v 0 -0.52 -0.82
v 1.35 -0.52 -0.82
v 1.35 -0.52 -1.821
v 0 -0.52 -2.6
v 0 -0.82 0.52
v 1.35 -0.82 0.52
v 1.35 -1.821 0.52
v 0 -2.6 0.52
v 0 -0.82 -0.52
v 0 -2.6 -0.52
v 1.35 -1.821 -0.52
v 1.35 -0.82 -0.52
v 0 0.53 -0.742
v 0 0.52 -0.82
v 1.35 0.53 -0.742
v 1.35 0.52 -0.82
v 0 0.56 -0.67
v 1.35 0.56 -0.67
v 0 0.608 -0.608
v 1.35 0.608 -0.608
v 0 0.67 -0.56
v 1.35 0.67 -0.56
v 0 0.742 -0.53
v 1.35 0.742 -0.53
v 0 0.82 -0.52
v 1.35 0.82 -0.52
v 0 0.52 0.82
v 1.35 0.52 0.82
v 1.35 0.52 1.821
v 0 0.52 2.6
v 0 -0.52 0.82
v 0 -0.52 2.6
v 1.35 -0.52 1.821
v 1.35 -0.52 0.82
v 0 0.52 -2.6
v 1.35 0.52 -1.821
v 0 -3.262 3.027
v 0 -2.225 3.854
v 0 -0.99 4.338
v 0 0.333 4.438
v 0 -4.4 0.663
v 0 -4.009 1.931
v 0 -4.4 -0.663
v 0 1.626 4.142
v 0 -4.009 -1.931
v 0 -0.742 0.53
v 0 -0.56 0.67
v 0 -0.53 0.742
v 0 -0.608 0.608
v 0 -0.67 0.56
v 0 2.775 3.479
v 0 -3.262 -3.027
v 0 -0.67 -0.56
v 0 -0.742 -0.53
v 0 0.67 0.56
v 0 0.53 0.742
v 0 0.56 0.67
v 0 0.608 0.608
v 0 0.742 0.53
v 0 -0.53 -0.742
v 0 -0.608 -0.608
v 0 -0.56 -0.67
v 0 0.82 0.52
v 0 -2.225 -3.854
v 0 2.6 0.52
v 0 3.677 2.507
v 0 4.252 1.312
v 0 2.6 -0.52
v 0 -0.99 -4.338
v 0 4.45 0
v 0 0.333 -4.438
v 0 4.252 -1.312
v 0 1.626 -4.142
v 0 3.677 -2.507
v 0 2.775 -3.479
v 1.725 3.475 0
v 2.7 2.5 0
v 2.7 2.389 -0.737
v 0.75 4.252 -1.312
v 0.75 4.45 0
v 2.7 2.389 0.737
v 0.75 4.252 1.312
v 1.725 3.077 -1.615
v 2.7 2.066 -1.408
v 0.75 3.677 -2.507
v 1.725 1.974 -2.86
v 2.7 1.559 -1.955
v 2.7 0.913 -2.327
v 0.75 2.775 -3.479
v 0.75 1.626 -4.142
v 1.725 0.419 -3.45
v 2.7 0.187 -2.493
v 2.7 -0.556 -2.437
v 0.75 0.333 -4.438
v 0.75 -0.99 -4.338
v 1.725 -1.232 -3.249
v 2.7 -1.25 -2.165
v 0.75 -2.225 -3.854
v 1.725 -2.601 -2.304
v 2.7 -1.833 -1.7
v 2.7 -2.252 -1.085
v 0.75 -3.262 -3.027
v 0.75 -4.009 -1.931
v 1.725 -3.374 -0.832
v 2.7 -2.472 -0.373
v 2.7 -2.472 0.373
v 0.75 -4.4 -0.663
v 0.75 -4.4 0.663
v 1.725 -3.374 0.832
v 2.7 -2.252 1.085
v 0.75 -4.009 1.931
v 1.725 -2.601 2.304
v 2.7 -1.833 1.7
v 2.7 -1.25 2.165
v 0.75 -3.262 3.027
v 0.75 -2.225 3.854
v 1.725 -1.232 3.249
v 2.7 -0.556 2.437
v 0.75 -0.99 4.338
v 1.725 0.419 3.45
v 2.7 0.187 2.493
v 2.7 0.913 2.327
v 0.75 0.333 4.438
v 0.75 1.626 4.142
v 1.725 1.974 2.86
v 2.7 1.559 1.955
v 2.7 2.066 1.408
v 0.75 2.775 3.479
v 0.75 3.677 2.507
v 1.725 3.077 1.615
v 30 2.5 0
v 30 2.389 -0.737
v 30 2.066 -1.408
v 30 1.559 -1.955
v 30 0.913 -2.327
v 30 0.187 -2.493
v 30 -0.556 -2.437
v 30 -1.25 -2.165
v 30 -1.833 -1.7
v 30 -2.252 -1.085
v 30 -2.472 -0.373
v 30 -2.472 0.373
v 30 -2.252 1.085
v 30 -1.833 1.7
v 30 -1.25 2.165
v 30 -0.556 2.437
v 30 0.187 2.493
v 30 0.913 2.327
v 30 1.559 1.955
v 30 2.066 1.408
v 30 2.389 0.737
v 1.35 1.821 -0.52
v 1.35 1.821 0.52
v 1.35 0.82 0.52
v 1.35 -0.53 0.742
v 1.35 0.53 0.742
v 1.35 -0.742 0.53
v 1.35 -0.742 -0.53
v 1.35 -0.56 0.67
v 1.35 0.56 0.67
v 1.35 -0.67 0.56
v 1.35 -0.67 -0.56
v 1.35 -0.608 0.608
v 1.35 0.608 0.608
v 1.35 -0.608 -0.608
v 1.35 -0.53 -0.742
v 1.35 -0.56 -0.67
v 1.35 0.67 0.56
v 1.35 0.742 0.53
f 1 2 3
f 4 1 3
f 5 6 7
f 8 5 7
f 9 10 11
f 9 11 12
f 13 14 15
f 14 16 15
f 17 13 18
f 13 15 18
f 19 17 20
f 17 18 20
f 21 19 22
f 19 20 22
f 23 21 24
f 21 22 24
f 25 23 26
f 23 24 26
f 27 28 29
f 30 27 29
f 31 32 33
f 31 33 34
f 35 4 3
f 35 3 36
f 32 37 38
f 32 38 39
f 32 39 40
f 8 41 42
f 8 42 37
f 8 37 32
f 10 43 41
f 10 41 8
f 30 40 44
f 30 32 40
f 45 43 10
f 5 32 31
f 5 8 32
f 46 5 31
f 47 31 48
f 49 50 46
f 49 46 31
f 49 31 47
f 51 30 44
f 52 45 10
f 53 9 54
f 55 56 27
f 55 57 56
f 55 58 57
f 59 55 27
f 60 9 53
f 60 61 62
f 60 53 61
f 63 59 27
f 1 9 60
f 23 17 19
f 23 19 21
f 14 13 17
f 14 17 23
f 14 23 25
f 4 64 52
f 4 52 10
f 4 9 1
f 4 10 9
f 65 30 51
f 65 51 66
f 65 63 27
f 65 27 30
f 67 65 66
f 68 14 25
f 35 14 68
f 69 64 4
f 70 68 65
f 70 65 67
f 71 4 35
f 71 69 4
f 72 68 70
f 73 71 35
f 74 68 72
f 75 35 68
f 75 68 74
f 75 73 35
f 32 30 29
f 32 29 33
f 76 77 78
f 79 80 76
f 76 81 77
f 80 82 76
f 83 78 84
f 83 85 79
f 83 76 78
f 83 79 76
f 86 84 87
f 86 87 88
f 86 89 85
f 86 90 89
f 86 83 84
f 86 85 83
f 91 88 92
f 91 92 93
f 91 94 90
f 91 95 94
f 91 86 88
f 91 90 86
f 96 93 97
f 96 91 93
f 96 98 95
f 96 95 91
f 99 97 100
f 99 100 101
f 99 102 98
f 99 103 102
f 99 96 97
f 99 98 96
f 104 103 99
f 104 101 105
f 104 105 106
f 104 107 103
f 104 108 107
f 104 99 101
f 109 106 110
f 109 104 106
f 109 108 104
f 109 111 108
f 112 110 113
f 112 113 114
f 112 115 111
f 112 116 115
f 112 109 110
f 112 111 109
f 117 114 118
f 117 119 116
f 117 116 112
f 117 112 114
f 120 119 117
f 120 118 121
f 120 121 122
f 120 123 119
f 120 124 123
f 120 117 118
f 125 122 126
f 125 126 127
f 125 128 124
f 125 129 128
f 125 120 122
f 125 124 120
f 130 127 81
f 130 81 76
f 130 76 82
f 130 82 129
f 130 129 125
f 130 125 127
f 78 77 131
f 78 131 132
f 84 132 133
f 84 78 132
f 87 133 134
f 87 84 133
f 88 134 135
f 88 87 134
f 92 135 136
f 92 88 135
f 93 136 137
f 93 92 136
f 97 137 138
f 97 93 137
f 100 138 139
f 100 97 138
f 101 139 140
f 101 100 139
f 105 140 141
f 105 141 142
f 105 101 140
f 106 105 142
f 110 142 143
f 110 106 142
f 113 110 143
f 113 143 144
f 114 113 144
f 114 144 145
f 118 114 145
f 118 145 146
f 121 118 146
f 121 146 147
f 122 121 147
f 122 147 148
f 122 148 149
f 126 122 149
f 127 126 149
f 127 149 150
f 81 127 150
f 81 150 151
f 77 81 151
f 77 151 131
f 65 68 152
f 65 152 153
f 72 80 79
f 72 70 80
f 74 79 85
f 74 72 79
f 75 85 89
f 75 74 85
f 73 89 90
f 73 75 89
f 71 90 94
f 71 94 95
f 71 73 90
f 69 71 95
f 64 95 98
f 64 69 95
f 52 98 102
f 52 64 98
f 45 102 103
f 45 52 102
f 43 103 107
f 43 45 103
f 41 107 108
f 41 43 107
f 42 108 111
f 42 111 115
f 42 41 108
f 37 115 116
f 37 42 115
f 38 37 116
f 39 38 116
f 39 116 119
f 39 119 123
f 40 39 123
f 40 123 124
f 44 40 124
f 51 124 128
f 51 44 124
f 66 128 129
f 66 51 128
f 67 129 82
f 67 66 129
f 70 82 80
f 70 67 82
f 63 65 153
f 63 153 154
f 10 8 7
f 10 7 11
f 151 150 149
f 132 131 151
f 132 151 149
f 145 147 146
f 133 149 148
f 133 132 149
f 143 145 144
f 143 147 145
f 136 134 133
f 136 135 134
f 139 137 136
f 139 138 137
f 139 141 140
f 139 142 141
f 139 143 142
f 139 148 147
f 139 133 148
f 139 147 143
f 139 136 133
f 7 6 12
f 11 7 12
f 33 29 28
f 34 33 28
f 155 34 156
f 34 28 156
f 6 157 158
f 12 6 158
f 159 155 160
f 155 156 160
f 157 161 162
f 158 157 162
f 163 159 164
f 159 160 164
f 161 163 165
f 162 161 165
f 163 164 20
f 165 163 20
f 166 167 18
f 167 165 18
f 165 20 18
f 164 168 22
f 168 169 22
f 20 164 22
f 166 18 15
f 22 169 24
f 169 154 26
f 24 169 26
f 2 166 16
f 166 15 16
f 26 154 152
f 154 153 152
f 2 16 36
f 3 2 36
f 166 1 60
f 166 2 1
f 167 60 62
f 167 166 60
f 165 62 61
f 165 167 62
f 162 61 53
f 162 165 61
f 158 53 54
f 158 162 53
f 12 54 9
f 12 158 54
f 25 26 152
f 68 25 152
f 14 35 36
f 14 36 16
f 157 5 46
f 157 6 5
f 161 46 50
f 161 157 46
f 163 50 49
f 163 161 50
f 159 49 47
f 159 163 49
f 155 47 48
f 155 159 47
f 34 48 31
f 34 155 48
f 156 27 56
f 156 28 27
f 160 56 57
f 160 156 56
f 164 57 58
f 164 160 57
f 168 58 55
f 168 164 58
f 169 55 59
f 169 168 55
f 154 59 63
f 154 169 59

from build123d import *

# Parameters (mm, degrees)
CROSSRECESS_DEPTH = 1.35
DRAFT9_ANGLE      = 30
FILLET5_R         = 0.3
SKETCH10_W        = 0.8
SKETCH10_H        = 2.5


with BuildPart() as part:
    # Sketch1 → Base (revolve)
    with BuildSketch(Plane.XY):
        Polygon((30, 2.5), (4.3, 2.5), (2.7, 2.5), (0.75, 4.45), (0, 4.45), (0, 0), (30, 0), align=None)
    revolve(axis=Axis((4.515812911, 0, 0), (-1, 0, 0)))

    # Sketch6 → CrossRecess (cut)
    with BuildSketch(Plane(origin=(0, 0, 0), x_dir=(0, 0, -1), z_dir=(1, 0, 0))):
        Polygon((0.52, 0.52), (0.52, 2.6), (-0.52, 2.6), (-0.52, 0.52), (-2.6, 0.52), (-2.6, -0.52), (-0.52, -0.52), (-0.52, -2.6), (0.52, -2.6), (0.52, -0.52), (2.6, -0.52), (2.6, 0.52), align=None)
    extrude(amount=CROSSRECESS_DEPTH, mode=Mode.SUBTRACT)

    # Draft9
    draft9_faces = [part.faces().sort_by_distance(p)[0] for p in [
        (0.675, -2.6, 0),
        (0.675, 0, 2.6),
        (0.675, 0, -2.6),
        (0.675, 2.6, 0),
    ]]
    draft(draft9_faces, Plane(origin=(0, 4.45, 0), x_dir=(0, 0, -1), z_dir=(-1, 0, 0)), DRAFT9_ANGLE)

    # Fillet5
    fillet5_edges = [part.edges().sort_by_distance(p)[0] for p in [
        (0.675, 0.52, 0.52),
        (0.675, -0.52, 0.52),
        (0.675, -0.52, -0.52),
        (0.675, 0.52, -0.52),
    ]]
    fillet(fillet5_edges, radius=FILLET5_R)

    # Sketch10 → Revolve2 (revolve)
    with BuildSketch(Plane.XY):
        with Locations((3.1, 1.25)):
            Rectangle(SKETCH10_W, SKETCH10_H)
    revolve(axis=Axis((62.228915663, 0, 0), (-1, 0, 0)))


solid = part.part
